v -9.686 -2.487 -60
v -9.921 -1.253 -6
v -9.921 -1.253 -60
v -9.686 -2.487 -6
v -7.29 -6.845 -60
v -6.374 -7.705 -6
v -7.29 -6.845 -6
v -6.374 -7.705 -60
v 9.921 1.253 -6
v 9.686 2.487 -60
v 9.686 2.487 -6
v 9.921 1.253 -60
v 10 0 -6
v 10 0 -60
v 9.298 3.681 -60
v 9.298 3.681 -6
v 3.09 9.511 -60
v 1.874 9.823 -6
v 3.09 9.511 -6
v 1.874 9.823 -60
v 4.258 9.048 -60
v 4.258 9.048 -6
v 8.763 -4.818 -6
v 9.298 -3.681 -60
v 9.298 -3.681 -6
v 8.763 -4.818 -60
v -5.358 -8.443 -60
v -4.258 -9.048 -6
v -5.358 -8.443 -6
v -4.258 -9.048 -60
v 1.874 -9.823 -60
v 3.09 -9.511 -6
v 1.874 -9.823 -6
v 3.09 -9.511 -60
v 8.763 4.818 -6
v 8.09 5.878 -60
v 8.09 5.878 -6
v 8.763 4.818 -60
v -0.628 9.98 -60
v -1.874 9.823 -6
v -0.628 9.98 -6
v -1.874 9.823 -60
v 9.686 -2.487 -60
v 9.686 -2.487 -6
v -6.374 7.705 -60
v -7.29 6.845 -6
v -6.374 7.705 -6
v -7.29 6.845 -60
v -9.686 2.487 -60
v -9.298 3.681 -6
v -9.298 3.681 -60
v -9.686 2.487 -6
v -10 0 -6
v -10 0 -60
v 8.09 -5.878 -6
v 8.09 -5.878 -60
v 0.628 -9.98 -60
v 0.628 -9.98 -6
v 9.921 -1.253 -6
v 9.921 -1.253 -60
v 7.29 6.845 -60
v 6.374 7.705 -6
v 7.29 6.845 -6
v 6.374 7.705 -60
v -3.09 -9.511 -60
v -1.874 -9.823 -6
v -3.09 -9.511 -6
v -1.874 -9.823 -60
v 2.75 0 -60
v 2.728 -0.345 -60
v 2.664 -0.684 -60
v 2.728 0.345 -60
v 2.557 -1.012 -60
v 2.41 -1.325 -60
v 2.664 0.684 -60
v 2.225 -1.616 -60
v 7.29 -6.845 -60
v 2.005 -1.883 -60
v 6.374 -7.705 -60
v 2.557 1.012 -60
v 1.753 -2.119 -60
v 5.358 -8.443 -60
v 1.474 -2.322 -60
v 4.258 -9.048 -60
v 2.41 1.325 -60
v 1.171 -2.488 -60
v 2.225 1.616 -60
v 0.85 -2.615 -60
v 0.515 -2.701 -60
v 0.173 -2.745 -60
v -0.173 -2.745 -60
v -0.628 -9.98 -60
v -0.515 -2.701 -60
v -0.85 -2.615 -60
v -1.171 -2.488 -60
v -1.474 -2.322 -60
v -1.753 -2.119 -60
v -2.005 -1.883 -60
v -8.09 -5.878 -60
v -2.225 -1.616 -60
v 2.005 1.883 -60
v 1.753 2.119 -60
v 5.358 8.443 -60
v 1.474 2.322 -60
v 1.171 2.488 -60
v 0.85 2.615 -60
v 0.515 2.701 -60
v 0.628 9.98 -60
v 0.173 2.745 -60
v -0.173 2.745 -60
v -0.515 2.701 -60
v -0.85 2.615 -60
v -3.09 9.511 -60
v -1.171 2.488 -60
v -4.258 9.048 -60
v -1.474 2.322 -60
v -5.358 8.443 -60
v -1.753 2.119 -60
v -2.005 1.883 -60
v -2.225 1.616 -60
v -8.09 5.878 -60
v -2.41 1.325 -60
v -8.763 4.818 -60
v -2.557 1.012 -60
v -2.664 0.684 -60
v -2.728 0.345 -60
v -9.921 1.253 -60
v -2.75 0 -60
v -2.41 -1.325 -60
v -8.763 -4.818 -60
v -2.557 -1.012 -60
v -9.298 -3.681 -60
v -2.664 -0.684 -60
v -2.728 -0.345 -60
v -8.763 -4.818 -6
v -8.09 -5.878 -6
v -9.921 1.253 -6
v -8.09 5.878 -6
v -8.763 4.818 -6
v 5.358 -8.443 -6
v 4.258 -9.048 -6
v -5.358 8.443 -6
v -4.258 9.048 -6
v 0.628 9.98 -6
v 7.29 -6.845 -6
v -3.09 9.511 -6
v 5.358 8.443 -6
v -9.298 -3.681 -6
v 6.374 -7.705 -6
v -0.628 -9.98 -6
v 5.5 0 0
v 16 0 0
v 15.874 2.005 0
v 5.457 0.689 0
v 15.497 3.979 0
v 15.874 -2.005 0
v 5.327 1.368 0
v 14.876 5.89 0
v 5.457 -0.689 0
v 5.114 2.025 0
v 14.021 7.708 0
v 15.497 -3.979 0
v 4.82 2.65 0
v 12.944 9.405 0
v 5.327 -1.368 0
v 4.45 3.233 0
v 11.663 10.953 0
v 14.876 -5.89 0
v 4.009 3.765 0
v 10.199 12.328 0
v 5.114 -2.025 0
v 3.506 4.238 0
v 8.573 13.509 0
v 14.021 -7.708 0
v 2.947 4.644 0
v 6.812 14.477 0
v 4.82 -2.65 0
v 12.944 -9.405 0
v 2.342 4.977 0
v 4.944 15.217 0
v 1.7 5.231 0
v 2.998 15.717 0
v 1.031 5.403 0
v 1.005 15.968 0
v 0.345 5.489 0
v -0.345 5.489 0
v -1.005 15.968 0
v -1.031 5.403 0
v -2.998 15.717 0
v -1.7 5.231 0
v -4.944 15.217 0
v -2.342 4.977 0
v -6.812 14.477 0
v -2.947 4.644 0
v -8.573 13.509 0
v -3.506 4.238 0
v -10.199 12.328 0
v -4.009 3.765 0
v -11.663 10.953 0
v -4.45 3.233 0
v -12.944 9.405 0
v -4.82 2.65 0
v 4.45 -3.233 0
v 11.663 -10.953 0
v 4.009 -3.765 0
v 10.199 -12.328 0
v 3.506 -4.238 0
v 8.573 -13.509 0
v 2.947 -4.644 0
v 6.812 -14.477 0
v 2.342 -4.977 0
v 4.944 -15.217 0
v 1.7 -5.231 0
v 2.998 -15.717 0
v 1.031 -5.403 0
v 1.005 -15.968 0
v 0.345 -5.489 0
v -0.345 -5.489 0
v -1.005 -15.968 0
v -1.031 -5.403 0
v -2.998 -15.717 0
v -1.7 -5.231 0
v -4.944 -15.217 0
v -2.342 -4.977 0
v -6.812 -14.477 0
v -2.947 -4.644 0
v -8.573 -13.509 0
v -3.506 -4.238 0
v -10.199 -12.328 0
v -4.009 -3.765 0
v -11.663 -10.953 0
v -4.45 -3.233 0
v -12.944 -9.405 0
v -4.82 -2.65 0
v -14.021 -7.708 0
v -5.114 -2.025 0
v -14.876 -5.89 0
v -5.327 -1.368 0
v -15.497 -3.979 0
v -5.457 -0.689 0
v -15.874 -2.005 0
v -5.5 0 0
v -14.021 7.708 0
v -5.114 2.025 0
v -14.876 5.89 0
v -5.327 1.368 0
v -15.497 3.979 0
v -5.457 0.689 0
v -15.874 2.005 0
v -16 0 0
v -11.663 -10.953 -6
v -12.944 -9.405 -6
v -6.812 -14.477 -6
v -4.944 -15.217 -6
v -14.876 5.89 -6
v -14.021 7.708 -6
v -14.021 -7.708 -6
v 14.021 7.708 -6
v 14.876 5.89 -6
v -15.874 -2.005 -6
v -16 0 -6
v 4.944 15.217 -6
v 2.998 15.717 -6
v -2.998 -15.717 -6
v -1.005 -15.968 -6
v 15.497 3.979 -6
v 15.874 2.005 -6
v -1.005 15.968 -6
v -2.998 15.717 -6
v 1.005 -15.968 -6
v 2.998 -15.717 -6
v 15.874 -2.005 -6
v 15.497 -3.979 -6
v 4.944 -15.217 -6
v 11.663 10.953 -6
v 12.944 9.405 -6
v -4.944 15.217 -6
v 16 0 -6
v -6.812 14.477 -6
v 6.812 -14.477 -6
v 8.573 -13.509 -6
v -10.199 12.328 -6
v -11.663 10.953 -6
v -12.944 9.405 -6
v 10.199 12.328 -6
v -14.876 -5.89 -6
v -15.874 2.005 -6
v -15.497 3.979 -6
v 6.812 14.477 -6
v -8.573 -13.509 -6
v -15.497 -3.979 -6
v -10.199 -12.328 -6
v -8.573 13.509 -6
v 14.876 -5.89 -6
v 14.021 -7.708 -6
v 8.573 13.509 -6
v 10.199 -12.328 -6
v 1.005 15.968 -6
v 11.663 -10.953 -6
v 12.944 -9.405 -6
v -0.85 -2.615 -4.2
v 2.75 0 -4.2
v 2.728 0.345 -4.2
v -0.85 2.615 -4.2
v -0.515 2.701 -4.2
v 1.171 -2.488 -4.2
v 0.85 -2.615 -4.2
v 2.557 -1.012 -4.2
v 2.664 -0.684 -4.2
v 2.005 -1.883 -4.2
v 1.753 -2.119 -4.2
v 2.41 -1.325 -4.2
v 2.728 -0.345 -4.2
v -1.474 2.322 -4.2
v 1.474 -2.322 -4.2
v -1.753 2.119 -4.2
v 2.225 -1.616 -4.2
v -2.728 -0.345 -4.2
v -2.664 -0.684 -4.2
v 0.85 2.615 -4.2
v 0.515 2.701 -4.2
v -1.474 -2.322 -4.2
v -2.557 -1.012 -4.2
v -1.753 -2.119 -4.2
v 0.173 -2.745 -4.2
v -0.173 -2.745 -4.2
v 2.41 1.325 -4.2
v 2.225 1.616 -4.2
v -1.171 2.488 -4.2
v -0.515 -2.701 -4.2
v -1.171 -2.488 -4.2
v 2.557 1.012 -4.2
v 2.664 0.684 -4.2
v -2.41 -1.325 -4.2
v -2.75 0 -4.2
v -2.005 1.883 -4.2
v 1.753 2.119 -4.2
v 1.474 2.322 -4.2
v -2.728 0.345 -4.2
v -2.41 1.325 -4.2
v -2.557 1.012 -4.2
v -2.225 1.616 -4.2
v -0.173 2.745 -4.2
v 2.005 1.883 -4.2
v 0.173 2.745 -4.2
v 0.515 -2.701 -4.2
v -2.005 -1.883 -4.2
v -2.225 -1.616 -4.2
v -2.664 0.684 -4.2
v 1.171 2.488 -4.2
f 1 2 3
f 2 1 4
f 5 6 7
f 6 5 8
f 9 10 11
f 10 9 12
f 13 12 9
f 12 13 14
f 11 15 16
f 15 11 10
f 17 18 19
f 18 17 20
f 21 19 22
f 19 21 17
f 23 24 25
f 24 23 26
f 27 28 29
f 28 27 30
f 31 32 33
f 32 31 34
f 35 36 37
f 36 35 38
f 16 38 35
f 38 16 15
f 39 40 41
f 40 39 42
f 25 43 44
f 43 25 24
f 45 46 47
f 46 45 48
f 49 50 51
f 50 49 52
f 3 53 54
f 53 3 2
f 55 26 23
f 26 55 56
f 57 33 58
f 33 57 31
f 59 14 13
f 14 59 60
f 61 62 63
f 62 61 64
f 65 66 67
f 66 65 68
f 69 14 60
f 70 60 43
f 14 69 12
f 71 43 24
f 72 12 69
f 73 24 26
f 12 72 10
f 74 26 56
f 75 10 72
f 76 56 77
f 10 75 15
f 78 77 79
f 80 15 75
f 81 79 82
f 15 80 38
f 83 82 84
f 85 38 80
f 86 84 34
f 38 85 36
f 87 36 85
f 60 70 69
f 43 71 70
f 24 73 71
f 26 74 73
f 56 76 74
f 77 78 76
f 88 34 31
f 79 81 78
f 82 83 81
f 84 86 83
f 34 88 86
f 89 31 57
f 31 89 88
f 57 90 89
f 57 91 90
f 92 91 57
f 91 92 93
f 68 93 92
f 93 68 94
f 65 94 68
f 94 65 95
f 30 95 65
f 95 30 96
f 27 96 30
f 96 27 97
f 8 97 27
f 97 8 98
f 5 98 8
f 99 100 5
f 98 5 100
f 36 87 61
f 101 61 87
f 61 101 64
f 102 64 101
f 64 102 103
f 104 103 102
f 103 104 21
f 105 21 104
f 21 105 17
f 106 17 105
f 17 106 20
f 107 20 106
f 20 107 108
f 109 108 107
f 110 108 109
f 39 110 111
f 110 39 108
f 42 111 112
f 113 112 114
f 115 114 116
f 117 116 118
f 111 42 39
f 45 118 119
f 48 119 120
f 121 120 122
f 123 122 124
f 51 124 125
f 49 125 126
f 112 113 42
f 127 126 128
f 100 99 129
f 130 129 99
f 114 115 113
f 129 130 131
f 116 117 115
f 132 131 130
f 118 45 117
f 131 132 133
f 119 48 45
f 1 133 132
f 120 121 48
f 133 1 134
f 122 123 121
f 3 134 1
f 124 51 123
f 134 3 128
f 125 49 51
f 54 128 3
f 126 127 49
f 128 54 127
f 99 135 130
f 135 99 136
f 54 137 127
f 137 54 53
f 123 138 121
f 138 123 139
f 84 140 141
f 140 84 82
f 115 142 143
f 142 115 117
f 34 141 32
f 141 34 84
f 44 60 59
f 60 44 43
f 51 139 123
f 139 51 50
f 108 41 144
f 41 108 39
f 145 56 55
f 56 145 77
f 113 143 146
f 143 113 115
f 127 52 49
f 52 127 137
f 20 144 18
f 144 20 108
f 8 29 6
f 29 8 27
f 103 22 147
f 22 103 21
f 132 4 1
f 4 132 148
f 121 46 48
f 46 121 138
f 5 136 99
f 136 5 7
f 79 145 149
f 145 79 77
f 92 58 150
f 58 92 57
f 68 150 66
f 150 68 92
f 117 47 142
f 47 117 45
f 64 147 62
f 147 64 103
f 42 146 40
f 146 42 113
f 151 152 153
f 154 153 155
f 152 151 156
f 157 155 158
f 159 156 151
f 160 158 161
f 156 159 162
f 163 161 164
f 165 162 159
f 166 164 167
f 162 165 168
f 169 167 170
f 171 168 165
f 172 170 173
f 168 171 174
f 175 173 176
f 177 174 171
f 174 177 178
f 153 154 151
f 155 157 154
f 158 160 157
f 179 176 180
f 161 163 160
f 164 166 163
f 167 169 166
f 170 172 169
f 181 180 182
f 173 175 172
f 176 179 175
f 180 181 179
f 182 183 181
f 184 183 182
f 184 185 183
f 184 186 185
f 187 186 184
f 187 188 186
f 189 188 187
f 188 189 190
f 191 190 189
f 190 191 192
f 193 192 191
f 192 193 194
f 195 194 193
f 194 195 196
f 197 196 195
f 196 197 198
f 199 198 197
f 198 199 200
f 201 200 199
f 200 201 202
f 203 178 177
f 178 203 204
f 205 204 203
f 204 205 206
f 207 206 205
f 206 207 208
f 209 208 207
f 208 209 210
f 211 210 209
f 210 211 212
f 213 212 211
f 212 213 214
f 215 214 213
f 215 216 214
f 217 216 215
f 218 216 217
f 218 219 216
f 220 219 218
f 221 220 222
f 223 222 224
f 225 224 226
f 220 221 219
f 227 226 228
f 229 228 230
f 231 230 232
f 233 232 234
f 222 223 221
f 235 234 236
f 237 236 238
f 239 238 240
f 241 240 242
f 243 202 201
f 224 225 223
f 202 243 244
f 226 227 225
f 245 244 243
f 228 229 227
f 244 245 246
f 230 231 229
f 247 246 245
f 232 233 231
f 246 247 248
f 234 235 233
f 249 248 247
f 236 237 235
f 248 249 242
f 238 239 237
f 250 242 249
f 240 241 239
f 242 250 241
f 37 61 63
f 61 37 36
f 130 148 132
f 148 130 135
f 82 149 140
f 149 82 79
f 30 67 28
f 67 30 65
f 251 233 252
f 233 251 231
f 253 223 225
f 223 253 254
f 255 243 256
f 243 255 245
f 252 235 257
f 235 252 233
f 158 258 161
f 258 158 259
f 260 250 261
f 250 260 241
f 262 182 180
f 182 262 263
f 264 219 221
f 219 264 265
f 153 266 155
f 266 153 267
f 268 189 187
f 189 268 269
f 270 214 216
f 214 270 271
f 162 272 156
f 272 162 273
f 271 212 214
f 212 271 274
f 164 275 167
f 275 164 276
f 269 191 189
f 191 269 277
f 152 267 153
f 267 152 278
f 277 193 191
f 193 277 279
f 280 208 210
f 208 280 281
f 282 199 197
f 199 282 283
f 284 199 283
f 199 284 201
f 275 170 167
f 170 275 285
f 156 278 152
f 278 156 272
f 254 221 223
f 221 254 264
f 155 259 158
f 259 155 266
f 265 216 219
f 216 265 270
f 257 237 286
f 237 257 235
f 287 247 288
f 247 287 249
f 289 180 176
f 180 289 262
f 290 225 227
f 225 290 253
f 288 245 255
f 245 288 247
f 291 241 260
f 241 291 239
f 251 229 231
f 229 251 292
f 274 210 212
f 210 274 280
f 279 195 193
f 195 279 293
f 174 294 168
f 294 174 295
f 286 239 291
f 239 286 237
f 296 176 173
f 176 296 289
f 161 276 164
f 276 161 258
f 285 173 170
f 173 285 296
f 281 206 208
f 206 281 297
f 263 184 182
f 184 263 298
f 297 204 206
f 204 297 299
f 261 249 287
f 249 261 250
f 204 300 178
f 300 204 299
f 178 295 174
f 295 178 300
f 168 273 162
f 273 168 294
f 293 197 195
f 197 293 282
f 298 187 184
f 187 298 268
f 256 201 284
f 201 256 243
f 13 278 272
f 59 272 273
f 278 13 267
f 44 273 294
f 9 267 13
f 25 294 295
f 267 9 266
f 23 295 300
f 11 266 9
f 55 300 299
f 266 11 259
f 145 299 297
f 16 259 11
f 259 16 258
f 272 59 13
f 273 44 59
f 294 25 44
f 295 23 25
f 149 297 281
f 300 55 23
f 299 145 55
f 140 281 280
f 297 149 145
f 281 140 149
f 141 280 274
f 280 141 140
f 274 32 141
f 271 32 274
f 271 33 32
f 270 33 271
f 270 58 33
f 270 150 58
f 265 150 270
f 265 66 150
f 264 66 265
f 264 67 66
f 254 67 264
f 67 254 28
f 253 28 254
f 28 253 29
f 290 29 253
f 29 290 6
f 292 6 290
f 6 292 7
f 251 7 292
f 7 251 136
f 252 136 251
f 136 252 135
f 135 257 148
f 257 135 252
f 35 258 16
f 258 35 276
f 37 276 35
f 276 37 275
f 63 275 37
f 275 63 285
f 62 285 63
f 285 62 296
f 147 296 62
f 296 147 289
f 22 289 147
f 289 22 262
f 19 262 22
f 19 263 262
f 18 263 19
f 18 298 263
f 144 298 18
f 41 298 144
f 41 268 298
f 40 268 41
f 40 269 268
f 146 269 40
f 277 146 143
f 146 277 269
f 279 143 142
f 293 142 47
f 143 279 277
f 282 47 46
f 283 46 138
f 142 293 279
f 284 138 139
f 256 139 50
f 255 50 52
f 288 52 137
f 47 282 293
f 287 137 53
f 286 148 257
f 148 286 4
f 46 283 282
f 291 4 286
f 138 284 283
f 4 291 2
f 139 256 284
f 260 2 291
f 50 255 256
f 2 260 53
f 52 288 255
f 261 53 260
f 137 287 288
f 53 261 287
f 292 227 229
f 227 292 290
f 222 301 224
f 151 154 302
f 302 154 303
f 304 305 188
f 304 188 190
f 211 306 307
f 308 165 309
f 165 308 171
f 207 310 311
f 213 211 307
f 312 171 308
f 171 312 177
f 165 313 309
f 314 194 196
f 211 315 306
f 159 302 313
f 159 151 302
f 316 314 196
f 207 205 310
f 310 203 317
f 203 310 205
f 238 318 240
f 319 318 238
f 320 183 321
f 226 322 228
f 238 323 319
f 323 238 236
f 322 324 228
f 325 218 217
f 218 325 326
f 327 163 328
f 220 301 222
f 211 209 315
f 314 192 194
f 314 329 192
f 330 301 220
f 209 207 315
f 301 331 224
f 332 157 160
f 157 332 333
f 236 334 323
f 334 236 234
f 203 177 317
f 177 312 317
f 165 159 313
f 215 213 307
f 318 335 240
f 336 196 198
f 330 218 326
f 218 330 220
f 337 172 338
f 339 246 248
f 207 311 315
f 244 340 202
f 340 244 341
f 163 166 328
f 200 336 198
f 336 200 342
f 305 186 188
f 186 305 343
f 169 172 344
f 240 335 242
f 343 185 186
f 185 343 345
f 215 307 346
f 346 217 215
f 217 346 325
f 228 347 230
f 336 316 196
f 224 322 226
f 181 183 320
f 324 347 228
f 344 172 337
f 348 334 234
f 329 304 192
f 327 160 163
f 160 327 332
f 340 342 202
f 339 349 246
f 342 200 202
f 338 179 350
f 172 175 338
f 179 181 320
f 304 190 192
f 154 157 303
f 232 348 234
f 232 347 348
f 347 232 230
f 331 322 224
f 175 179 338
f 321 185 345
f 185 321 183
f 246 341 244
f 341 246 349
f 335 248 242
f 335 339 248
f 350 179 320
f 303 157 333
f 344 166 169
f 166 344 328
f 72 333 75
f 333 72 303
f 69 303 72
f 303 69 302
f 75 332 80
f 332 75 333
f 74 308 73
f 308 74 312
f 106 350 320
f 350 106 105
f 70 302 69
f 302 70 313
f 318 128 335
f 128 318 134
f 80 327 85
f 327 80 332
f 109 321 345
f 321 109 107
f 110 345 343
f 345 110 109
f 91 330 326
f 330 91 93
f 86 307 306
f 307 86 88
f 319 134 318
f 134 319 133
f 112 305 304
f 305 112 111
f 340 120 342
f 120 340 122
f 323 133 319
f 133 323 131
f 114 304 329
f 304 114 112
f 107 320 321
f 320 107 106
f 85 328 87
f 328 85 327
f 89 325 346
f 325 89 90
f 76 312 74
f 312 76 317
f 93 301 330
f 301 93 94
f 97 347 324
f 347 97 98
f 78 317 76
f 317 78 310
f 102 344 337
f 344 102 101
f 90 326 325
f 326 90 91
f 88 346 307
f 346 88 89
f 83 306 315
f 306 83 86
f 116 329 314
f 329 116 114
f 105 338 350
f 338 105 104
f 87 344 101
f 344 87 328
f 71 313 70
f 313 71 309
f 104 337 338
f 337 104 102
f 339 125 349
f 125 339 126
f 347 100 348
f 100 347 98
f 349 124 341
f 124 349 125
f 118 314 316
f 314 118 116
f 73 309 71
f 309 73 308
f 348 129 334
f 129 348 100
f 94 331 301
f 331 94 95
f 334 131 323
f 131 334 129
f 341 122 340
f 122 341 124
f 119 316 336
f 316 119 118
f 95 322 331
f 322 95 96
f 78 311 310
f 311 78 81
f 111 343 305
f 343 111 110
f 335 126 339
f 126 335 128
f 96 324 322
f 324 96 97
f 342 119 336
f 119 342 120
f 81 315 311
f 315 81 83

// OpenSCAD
$fn = 50;


difference() {
	union() {
		translate(v = [0, 0, -60.0000000000]) {
			cylinder(h = 60, r = 10.0000000000);
		}
		translate(v = [0, 0, -6.0000000000]) {
			cylinder(h = 6, r = 16.0000000000);
		}
	}
	union() {
		translate(v = [0, 0, 0]) {
			rotate(a = [0, 0, 0]) {
				difference() {
					union() {
						#translate(v = [0, 0, -60.0000000000]) {
							cylinder(h = 60, r = 2.2500000000);
						}
						#translate(v = [0, 0, -4.2000000000]) {
							cylinder(h = 4.2000000000, r = 10.0000000000, r1 = 2.7500000000, r2 = 5.5000000000);
						}
						#translate(v = [0, 0, -60.0000000000]) {
							cylinder(h = 60, r = 2.7500000000);
						}
						#translate(v = [0, 0, -60.0000000000]) {
							cylinder(h = 60, r = 2.2500000000);
						}
					}
					union();
				}
			}
		}
	}
}
